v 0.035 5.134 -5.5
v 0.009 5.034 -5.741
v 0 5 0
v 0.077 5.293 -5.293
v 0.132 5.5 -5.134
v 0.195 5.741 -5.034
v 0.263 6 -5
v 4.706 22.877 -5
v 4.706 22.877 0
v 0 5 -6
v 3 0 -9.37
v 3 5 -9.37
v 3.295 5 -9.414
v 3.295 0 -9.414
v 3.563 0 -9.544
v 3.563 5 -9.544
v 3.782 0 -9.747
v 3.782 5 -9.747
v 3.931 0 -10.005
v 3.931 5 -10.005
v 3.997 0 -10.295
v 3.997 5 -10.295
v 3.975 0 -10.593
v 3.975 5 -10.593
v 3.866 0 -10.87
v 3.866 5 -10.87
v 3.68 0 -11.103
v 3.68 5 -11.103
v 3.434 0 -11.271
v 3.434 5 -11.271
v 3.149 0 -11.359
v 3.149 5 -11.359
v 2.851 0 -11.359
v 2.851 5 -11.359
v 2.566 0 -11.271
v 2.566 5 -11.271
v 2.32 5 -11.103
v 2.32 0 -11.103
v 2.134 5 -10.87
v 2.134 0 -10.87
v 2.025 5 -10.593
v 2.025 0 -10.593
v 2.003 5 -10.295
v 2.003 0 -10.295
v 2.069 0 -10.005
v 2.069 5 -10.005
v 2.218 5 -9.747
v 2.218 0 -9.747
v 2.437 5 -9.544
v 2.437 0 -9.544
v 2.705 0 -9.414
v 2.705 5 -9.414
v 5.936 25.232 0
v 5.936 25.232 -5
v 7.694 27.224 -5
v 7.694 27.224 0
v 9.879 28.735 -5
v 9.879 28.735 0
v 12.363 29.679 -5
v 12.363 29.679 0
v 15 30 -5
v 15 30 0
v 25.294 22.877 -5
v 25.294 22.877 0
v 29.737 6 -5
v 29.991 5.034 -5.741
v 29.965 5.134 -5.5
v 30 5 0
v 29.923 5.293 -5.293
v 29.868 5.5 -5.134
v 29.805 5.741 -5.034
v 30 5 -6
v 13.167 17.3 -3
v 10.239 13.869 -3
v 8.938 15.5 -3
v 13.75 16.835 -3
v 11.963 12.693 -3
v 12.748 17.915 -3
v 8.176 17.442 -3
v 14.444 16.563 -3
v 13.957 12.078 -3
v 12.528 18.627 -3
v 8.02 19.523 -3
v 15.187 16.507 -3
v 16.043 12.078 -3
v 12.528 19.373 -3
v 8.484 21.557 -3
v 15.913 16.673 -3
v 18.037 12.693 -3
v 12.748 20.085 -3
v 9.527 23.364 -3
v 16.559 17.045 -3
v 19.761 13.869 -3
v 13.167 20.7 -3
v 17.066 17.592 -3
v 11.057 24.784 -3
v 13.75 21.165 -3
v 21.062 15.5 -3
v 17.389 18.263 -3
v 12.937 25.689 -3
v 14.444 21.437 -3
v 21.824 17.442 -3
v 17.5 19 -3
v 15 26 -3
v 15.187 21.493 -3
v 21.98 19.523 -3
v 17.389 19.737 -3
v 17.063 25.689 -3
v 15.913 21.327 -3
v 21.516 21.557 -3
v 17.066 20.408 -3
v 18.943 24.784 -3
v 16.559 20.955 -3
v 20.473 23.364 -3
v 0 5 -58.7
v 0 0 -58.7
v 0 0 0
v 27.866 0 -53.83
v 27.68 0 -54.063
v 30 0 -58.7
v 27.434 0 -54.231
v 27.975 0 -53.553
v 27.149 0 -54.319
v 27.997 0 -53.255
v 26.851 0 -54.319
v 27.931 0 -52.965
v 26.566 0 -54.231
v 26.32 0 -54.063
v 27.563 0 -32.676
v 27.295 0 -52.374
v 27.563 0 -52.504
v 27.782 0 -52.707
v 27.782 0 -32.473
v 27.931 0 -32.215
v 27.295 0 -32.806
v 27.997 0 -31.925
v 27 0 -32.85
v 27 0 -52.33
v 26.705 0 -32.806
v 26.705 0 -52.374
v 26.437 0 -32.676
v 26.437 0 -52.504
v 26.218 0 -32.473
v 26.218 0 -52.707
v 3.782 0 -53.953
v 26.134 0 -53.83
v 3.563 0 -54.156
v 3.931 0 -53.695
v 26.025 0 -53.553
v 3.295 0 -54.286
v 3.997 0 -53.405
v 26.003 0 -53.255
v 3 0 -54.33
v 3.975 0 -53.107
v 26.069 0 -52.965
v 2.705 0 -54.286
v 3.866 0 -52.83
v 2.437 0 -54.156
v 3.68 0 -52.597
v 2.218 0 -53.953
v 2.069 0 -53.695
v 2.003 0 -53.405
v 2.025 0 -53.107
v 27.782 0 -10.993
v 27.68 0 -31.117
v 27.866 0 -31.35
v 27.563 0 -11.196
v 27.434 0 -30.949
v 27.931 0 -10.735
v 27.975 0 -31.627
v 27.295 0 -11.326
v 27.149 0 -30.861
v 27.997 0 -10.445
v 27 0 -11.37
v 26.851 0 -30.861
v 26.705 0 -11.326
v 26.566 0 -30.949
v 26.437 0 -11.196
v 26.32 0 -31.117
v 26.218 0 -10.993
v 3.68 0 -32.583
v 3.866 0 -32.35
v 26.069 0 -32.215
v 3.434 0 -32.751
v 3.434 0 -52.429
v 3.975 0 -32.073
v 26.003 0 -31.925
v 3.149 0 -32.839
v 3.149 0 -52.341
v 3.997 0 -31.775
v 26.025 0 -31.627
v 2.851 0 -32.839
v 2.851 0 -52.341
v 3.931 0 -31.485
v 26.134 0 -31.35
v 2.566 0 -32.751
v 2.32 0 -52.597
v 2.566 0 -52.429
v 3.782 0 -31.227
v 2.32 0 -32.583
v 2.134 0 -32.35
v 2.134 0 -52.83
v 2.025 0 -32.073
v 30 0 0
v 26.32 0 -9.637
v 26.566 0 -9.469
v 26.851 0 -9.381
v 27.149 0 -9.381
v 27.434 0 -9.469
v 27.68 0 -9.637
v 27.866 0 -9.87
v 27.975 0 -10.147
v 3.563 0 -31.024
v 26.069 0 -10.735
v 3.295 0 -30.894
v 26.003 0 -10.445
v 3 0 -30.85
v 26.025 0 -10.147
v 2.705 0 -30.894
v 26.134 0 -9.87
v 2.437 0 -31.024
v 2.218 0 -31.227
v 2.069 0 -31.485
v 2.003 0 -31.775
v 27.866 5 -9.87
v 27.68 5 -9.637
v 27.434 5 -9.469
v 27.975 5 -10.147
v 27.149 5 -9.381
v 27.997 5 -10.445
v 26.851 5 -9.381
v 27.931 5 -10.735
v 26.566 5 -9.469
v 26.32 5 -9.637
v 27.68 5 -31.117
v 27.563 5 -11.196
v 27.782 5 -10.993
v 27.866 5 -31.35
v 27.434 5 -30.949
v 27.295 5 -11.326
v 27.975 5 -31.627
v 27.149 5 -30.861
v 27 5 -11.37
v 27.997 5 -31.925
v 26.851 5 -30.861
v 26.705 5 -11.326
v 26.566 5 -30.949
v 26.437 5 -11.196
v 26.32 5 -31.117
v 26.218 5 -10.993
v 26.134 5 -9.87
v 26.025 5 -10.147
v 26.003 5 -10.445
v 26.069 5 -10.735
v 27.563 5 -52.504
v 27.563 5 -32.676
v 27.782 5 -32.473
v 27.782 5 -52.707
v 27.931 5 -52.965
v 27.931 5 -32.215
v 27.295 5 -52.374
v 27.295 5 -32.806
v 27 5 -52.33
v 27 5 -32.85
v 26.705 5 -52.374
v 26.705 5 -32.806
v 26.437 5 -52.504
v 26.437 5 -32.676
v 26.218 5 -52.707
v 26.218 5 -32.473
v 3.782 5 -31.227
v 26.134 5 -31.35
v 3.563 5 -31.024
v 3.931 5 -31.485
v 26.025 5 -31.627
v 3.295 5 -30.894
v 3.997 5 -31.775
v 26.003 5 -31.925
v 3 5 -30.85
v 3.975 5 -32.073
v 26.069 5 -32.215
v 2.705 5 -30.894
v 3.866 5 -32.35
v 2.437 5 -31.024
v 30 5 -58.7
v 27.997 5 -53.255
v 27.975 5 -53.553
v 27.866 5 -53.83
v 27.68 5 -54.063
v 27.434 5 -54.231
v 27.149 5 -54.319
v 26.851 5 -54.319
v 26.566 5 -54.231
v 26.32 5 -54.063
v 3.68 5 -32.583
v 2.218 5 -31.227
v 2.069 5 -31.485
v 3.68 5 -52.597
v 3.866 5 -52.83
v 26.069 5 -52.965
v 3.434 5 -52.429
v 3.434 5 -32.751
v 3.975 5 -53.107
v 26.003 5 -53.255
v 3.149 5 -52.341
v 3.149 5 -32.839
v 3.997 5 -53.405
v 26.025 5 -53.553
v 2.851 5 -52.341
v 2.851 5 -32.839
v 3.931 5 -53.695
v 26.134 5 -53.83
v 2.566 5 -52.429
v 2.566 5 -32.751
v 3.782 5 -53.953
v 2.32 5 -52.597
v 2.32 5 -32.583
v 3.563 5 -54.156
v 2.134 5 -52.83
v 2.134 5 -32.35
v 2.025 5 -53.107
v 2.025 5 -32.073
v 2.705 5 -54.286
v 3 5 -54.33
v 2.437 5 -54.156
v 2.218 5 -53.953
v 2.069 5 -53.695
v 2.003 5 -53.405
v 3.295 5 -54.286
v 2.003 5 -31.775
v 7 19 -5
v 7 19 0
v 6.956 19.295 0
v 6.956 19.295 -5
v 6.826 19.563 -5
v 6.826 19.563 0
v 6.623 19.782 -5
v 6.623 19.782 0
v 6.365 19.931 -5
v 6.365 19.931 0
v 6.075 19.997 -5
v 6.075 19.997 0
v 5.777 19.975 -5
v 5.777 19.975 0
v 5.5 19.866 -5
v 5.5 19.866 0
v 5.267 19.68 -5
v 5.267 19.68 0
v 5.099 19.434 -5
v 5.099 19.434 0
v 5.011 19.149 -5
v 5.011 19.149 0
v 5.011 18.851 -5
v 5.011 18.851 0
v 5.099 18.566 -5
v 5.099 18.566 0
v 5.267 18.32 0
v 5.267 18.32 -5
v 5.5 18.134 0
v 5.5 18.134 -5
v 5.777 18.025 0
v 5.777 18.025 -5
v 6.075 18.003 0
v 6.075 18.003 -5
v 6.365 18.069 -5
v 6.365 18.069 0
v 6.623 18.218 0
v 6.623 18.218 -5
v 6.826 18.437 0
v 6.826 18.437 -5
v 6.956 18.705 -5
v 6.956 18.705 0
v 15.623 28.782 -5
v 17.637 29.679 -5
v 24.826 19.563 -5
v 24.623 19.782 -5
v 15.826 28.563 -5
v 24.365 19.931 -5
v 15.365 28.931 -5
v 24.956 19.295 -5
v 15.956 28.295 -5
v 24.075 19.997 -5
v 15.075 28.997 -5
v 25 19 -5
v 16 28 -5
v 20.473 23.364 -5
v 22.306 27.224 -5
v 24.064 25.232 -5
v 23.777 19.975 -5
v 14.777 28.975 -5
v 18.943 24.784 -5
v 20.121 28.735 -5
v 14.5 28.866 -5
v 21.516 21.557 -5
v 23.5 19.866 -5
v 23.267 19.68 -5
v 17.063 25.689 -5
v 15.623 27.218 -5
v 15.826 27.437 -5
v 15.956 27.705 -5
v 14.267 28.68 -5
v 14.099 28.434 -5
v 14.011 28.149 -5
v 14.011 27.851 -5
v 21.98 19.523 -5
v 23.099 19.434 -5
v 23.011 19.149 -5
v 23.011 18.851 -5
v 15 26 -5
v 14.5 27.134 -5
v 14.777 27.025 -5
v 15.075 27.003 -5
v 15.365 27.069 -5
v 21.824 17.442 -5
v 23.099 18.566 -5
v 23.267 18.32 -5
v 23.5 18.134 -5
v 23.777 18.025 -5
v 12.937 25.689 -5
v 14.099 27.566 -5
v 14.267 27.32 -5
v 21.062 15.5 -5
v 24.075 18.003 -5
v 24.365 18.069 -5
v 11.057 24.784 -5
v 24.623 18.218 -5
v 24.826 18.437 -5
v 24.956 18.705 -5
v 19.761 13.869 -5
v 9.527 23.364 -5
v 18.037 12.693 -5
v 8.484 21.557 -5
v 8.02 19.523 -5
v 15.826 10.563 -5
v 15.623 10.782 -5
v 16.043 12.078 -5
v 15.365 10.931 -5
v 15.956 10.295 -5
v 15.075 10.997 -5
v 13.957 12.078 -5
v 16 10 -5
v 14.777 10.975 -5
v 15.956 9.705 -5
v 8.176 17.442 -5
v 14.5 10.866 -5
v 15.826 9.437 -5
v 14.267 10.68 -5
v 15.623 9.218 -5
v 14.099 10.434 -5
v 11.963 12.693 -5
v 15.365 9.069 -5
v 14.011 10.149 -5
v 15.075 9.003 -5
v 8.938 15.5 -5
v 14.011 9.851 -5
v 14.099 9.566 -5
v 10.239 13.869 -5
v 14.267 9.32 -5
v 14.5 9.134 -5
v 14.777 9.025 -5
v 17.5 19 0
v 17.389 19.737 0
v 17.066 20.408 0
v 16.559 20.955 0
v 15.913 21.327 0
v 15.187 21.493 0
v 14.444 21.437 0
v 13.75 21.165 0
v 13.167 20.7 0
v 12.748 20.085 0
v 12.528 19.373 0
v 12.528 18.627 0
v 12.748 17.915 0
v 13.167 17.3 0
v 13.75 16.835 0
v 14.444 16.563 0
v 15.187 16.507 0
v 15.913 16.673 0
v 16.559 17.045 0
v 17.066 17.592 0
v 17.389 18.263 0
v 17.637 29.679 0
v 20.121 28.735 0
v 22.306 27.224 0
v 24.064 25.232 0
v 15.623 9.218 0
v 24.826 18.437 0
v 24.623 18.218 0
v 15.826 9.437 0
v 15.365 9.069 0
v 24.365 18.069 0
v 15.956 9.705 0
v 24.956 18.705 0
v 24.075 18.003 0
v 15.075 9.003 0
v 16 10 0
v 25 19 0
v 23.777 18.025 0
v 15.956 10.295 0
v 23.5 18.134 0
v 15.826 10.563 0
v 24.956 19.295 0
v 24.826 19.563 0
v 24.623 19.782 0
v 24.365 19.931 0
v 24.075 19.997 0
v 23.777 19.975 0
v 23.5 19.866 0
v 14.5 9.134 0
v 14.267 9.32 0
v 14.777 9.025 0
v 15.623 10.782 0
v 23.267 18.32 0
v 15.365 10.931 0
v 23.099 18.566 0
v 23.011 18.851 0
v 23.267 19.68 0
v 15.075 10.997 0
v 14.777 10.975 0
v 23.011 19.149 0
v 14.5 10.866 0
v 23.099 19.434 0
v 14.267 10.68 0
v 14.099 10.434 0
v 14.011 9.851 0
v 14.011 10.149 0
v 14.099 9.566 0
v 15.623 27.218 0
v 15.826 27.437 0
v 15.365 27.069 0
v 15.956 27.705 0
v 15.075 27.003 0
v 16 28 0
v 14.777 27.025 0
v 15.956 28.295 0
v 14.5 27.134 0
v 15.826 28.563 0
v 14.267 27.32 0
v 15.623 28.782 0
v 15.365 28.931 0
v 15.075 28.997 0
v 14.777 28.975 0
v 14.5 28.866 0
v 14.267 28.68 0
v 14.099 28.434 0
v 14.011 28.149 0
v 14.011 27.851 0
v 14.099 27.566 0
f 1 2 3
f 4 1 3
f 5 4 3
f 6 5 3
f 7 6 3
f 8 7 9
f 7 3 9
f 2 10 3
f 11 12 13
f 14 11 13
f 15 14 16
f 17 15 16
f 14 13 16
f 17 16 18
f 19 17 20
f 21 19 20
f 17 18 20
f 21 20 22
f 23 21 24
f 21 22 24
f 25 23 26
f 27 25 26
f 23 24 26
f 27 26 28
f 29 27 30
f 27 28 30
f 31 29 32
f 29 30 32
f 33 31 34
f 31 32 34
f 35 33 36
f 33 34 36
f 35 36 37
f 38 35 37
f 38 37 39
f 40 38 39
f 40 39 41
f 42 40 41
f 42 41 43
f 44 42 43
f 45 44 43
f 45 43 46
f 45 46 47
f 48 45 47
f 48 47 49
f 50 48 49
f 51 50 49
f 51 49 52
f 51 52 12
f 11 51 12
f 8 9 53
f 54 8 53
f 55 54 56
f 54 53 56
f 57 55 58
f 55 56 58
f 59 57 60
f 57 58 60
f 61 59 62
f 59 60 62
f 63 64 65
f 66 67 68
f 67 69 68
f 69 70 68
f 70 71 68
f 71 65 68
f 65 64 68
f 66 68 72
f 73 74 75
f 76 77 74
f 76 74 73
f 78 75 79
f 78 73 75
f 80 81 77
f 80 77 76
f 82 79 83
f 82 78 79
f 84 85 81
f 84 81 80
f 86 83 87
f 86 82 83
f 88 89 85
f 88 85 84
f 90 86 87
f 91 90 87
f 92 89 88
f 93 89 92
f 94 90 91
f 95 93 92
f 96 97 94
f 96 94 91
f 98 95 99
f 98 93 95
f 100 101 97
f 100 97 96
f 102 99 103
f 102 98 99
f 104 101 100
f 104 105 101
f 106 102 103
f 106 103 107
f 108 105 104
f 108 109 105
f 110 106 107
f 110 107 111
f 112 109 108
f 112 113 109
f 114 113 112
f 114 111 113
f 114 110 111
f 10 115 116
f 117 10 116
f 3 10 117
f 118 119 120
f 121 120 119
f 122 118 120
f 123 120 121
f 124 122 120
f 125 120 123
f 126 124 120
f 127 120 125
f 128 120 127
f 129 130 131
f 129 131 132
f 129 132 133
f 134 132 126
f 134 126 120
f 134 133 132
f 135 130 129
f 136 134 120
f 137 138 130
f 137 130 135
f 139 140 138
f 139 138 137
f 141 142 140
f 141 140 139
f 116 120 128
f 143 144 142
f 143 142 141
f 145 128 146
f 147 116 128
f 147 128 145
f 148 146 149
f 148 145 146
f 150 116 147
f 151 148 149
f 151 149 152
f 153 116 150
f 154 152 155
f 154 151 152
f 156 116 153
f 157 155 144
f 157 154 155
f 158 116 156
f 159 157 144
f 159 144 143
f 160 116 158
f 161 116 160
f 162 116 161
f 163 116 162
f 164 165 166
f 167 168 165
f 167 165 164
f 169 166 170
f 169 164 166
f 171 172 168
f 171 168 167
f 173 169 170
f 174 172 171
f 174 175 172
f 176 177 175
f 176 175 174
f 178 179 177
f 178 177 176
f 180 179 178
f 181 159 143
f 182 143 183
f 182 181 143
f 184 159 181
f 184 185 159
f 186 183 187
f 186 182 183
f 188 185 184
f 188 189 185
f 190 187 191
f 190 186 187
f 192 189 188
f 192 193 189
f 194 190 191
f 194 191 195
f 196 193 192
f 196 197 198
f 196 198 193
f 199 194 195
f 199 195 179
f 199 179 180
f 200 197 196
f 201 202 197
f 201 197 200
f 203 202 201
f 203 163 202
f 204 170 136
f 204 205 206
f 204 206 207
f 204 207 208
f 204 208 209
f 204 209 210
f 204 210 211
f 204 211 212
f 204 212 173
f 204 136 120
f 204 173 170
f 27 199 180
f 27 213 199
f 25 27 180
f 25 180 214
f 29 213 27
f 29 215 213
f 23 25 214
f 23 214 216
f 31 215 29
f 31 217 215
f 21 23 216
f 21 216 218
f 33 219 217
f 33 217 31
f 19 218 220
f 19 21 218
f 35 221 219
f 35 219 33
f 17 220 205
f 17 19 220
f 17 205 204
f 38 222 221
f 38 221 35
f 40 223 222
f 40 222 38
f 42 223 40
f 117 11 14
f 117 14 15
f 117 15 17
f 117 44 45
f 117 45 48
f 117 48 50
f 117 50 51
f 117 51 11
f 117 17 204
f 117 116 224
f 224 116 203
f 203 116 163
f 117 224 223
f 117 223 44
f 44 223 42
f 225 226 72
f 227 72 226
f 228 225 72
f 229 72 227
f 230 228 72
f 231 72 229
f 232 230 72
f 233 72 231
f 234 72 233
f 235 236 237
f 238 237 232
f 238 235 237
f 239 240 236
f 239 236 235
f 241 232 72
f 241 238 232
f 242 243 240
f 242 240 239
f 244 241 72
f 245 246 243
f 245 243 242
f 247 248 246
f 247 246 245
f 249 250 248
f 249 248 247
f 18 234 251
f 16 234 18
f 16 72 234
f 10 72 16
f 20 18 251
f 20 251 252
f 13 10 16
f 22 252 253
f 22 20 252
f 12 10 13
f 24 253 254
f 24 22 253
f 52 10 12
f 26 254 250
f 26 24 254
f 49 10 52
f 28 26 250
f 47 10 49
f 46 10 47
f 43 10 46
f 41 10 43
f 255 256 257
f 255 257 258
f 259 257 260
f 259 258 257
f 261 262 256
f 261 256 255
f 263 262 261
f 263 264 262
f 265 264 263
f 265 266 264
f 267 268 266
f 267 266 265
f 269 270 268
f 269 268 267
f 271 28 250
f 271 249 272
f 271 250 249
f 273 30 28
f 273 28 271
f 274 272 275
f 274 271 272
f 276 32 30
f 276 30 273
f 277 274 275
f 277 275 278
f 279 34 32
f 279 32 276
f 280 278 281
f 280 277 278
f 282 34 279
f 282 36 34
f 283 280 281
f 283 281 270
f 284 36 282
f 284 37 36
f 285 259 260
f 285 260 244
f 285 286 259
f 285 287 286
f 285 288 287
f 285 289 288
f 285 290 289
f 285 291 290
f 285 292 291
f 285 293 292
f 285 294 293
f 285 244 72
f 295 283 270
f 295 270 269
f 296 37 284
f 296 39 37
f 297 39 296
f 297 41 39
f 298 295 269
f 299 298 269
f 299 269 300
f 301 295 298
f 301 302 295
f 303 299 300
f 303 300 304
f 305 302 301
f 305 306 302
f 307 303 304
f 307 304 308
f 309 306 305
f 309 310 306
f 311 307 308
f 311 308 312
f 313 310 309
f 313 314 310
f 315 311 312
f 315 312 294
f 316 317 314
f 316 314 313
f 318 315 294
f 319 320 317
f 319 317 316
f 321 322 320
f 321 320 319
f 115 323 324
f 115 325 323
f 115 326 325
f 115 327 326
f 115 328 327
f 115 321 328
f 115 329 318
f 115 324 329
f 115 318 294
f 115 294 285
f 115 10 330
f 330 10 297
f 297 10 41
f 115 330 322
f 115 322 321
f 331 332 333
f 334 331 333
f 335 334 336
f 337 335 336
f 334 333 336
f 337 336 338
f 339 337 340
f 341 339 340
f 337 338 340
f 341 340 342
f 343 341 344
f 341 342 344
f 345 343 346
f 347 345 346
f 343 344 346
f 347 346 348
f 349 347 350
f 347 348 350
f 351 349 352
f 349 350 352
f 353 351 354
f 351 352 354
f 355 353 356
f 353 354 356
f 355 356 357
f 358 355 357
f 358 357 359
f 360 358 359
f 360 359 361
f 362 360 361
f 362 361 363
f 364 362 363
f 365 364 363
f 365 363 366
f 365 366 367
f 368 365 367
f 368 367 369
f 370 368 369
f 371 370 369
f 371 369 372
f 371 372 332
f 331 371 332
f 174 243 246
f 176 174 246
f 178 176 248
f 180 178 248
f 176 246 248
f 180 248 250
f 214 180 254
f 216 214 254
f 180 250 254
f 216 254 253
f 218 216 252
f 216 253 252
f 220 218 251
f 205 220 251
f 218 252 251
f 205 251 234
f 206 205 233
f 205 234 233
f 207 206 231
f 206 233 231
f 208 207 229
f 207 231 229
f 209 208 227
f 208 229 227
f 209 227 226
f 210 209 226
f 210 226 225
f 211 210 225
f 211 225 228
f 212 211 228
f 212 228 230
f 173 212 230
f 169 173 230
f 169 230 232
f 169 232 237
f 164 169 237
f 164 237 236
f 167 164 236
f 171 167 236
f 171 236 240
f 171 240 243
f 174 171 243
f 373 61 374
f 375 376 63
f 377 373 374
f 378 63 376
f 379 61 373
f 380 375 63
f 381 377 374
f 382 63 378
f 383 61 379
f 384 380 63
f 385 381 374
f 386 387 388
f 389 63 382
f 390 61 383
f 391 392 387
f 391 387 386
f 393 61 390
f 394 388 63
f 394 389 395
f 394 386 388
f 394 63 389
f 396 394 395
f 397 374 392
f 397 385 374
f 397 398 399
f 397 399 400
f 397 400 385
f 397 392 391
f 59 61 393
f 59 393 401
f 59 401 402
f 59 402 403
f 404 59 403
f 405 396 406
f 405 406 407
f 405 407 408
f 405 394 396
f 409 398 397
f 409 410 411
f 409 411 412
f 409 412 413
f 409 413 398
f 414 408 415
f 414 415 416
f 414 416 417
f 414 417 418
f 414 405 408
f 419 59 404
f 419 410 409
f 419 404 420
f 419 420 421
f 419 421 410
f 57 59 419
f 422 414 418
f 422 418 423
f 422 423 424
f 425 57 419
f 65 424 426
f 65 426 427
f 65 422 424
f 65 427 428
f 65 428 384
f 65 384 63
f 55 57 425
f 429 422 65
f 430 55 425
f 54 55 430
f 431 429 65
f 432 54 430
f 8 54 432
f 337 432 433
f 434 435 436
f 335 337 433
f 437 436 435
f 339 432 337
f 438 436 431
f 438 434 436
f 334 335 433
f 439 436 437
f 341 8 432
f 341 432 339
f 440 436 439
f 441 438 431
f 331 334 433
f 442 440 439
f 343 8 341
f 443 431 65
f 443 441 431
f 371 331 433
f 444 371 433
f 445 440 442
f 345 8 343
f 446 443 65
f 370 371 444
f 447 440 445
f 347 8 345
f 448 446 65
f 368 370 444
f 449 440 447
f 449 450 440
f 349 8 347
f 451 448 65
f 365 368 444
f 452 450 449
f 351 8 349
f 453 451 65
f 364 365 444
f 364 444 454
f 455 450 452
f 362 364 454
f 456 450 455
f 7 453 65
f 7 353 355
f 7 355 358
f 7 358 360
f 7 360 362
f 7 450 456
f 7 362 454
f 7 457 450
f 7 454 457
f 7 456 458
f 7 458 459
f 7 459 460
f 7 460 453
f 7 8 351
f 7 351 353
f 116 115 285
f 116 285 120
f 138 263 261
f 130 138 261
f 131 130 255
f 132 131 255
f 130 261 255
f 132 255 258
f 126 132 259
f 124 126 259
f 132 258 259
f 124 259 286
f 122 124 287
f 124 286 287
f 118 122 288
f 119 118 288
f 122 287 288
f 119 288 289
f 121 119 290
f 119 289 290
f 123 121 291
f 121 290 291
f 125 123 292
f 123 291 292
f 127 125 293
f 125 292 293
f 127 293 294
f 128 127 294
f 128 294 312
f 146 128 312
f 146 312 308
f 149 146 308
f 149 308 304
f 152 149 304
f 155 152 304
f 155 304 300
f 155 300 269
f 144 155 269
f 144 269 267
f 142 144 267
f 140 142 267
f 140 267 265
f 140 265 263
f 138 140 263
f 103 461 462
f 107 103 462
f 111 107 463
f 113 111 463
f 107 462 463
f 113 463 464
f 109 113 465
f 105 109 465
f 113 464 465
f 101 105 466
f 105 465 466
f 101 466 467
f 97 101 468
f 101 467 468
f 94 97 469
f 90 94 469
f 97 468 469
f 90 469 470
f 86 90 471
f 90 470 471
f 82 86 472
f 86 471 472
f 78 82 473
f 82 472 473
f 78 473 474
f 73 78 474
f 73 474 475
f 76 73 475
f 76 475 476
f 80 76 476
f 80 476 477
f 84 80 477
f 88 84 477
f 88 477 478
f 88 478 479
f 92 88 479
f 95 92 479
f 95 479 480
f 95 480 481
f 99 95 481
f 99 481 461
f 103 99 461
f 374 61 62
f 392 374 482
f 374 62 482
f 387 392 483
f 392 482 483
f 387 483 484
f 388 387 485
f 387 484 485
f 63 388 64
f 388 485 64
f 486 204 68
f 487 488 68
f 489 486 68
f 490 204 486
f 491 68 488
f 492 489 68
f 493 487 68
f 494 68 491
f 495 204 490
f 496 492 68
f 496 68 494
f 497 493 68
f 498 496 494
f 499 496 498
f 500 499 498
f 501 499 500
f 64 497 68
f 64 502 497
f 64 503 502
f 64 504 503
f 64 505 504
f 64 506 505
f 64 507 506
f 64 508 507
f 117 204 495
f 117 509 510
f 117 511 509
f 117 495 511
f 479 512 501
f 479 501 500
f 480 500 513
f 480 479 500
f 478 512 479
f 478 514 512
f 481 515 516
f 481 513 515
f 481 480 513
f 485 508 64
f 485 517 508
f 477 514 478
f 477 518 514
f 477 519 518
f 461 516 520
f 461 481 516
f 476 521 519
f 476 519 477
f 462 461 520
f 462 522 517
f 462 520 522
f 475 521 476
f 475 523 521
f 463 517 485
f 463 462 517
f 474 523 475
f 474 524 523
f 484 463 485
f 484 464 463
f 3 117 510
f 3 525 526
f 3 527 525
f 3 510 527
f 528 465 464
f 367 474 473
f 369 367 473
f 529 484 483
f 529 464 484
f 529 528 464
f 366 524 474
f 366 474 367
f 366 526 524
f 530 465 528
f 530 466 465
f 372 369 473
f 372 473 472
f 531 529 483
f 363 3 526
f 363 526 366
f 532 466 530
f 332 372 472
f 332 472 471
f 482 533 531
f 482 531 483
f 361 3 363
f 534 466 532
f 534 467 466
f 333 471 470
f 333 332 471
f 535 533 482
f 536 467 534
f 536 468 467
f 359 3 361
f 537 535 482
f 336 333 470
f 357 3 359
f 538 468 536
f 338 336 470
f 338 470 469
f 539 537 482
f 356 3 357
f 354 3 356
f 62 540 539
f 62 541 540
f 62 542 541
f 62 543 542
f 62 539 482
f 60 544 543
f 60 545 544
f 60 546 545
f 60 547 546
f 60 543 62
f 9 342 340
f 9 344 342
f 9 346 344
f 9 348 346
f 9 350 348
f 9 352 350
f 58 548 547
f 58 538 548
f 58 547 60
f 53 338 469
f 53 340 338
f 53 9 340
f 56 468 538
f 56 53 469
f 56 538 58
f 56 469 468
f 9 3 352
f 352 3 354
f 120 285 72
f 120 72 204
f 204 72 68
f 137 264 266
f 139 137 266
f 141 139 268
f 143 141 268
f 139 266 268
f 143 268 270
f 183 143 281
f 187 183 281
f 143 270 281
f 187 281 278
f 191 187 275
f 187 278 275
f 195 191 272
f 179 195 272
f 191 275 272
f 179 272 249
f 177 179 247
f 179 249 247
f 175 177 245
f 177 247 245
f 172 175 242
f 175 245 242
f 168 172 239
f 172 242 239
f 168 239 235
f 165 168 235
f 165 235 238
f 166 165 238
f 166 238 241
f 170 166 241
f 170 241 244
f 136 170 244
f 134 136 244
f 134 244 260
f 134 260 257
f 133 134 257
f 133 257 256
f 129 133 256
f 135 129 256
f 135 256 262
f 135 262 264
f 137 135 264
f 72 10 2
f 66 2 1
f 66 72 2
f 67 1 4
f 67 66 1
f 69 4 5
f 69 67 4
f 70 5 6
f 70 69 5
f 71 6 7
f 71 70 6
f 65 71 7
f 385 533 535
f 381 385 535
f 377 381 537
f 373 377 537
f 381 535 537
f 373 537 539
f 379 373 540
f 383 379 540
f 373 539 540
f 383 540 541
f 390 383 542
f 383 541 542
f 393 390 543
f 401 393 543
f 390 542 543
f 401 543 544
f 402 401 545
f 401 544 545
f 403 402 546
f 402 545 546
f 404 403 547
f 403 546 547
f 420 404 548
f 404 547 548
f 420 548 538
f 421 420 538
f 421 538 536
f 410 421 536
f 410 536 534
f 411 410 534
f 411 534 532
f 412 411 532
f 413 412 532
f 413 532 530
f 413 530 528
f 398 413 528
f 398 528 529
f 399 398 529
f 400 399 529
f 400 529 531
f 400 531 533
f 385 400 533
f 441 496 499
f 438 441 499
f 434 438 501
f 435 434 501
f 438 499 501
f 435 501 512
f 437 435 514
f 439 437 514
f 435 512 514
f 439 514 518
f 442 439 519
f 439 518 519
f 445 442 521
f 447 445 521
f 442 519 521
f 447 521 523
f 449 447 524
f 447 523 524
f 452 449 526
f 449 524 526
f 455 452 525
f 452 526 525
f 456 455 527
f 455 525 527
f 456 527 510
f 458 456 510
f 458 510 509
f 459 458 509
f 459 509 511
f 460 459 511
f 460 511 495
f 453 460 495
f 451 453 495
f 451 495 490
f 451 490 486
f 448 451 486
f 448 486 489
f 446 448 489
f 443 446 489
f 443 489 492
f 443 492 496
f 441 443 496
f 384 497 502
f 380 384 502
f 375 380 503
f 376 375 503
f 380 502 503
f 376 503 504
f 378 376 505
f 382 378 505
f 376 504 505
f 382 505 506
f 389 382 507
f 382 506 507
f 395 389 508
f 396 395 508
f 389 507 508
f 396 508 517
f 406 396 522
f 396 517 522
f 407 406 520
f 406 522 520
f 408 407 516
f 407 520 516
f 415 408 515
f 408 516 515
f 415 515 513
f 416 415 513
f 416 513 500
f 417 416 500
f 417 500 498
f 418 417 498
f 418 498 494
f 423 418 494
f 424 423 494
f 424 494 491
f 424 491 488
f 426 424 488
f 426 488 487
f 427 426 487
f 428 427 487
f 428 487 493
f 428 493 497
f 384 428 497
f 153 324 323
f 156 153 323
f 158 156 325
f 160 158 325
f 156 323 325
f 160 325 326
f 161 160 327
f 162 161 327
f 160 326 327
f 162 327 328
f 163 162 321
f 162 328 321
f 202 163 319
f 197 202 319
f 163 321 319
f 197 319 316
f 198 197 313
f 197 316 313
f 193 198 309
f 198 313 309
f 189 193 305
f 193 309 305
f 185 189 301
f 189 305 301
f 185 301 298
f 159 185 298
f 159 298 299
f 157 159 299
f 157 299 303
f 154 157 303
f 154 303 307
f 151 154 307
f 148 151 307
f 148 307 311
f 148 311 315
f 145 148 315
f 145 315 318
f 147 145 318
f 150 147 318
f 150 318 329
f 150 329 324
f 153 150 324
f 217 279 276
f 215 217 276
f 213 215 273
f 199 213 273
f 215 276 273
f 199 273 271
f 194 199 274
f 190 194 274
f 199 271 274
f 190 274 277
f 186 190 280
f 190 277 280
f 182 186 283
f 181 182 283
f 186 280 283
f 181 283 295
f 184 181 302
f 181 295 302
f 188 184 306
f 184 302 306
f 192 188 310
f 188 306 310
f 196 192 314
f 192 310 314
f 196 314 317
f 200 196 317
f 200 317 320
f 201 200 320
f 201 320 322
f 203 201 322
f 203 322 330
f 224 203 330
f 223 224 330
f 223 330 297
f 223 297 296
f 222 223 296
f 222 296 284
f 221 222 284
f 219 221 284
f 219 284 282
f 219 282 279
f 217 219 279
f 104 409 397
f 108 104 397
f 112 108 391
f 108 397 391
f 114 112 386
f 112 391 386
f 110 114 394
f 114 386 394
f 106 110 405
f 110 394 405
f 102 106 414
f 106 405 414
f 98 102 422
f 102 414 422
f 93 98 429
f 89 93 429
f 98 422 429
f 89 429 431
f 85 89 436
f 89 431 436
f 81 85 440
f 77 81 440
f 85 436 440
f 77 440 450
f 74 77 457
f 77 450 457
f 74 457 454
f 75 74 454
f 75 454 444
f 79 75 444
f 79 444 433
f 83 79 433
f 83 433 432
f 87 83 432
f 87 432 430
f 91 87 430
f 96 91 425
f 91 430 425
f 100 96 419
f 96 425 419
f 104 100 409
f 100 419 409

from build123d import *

# Parameters (mm, degrees)
BOSS_EXTRU_1_DEPTH      = 30
ESQUISSE2_R             = 2.5
ESQUISSE2_R_2           = 1
ENL_V_MAT_EXTRU_1_DEPTH = 73.427135799
ESQUISSE3_R             = 7
ENL_V_MAT_EXTRU_2_DEPTH = 2
ESQUISSE4_R             = 1
ENL_V_MAT_EXTRU_3_DEPTH = 71.503120498
CONG_2_R                = 1


with BuildPart() as part:
    # Esquisse1 → Boss.-Extru.1 (new body)
    with BuildSketch(Plane(origin=(0, 0, 0), x_dir=(0, 0, -1), z_dir=(1, 0, 0))):
        Polygon((0, 0), (0, 30), (5, 30), (5, 5), (58.7, 5), (58.7, 0), align=None)
    extrude(amount=BOSS_EXTRU_1_DEPTH)

    # Esquisse2 → Enlèv. mat.-Extru.1 (cut, through all)
    with BuildSketch(Plane.XY):
        with BuildLine():
            Line((0, 30), (0, 5))
            Line((0, 5), (4.705924288, 22.877113002))
            ThreePointArc((4.705924288, 22.877113002), (8.740936293, 28.04566866), (15, 30))
            Line((15, 30), (0, 30))
        make_face()
        with BuildLine():
            Line((30, 30), (15, 30))
            ThreePointArc((15, 30), (21.259063707, 28.04566866), (25.294075712, 22.877113002))
            Line((25.294075712, 22.877113002), (30, 5))
            Line((30, 5), (30, 30))
        make_face()
        with Locations((15, 19)):
            Circle(ESQUISSE2_R)
        with Locations((15, 28)):
            Circle(ESQUISSE2_R_2)
        with Locations((24, 19)):
            Circle(ESQUISSE2_R_2)
        with Locations((15, 10)):
            Circle(ESQUISSE2_R_2)
        with Locations((6, 19)):
            Circle(ESQUISSE2_R_2)
    extrude(amount=-ENL_V_MAT_EXTRU_1_DEPTH, mode=Mode.SUBTRACT)

    # Esquisse3 → Enlèv. mat.-Extru.2 (cut)
    with BuildSketch(Plane(origin=(0, 0, -5), x_dir=(-1, 0, 0), z_dir=(0, 0, -1))):
        with Locations((-15, 19)):
            Circle(ESQUISSE3_R)
    extrude(amount=-ENL_V_MAT_EXTRU_2_DEPTH, mode=Mode.SUBTRACT)

    # Esquisse4 → Enlèv. mat.-Extru.3 (cut, through all)
    with BuildSketch(Plane(origin=(0, 5, 0), x_dir=(1, 0, 0), z_dir=(0, 1, 0))):
        with Locations((3, 10.37)):
            Circle(ESQUISSE4_R)
        with Locations((27, 10.37)):
            Circle(ESQUISSE4_R)
        with Locations((27, 53.33)):
            Circle(ESQUISSE4_R)
        with Locations((3, 53.33)):
            Circle(ESQUISSE4_R)
        with Locations((3, 31.85)):
            Circle(ESQUISSE4_R)
        with Locations((27, 31.85)):
            Circle(ESQUISSE4_R)
    extrude(amount=-ENL_V_MAT_EXTRU_3_DEPTH, mode=Mode.SUBTRACT)

    # Congé2
    cong_2_edges = [part.edges().sort_by_distance(p)[0] for p in [
        (15, 5, -5),
    ]]
    fillet(cong_2_edges, radius=CONG_2_R)


solid = part.part
